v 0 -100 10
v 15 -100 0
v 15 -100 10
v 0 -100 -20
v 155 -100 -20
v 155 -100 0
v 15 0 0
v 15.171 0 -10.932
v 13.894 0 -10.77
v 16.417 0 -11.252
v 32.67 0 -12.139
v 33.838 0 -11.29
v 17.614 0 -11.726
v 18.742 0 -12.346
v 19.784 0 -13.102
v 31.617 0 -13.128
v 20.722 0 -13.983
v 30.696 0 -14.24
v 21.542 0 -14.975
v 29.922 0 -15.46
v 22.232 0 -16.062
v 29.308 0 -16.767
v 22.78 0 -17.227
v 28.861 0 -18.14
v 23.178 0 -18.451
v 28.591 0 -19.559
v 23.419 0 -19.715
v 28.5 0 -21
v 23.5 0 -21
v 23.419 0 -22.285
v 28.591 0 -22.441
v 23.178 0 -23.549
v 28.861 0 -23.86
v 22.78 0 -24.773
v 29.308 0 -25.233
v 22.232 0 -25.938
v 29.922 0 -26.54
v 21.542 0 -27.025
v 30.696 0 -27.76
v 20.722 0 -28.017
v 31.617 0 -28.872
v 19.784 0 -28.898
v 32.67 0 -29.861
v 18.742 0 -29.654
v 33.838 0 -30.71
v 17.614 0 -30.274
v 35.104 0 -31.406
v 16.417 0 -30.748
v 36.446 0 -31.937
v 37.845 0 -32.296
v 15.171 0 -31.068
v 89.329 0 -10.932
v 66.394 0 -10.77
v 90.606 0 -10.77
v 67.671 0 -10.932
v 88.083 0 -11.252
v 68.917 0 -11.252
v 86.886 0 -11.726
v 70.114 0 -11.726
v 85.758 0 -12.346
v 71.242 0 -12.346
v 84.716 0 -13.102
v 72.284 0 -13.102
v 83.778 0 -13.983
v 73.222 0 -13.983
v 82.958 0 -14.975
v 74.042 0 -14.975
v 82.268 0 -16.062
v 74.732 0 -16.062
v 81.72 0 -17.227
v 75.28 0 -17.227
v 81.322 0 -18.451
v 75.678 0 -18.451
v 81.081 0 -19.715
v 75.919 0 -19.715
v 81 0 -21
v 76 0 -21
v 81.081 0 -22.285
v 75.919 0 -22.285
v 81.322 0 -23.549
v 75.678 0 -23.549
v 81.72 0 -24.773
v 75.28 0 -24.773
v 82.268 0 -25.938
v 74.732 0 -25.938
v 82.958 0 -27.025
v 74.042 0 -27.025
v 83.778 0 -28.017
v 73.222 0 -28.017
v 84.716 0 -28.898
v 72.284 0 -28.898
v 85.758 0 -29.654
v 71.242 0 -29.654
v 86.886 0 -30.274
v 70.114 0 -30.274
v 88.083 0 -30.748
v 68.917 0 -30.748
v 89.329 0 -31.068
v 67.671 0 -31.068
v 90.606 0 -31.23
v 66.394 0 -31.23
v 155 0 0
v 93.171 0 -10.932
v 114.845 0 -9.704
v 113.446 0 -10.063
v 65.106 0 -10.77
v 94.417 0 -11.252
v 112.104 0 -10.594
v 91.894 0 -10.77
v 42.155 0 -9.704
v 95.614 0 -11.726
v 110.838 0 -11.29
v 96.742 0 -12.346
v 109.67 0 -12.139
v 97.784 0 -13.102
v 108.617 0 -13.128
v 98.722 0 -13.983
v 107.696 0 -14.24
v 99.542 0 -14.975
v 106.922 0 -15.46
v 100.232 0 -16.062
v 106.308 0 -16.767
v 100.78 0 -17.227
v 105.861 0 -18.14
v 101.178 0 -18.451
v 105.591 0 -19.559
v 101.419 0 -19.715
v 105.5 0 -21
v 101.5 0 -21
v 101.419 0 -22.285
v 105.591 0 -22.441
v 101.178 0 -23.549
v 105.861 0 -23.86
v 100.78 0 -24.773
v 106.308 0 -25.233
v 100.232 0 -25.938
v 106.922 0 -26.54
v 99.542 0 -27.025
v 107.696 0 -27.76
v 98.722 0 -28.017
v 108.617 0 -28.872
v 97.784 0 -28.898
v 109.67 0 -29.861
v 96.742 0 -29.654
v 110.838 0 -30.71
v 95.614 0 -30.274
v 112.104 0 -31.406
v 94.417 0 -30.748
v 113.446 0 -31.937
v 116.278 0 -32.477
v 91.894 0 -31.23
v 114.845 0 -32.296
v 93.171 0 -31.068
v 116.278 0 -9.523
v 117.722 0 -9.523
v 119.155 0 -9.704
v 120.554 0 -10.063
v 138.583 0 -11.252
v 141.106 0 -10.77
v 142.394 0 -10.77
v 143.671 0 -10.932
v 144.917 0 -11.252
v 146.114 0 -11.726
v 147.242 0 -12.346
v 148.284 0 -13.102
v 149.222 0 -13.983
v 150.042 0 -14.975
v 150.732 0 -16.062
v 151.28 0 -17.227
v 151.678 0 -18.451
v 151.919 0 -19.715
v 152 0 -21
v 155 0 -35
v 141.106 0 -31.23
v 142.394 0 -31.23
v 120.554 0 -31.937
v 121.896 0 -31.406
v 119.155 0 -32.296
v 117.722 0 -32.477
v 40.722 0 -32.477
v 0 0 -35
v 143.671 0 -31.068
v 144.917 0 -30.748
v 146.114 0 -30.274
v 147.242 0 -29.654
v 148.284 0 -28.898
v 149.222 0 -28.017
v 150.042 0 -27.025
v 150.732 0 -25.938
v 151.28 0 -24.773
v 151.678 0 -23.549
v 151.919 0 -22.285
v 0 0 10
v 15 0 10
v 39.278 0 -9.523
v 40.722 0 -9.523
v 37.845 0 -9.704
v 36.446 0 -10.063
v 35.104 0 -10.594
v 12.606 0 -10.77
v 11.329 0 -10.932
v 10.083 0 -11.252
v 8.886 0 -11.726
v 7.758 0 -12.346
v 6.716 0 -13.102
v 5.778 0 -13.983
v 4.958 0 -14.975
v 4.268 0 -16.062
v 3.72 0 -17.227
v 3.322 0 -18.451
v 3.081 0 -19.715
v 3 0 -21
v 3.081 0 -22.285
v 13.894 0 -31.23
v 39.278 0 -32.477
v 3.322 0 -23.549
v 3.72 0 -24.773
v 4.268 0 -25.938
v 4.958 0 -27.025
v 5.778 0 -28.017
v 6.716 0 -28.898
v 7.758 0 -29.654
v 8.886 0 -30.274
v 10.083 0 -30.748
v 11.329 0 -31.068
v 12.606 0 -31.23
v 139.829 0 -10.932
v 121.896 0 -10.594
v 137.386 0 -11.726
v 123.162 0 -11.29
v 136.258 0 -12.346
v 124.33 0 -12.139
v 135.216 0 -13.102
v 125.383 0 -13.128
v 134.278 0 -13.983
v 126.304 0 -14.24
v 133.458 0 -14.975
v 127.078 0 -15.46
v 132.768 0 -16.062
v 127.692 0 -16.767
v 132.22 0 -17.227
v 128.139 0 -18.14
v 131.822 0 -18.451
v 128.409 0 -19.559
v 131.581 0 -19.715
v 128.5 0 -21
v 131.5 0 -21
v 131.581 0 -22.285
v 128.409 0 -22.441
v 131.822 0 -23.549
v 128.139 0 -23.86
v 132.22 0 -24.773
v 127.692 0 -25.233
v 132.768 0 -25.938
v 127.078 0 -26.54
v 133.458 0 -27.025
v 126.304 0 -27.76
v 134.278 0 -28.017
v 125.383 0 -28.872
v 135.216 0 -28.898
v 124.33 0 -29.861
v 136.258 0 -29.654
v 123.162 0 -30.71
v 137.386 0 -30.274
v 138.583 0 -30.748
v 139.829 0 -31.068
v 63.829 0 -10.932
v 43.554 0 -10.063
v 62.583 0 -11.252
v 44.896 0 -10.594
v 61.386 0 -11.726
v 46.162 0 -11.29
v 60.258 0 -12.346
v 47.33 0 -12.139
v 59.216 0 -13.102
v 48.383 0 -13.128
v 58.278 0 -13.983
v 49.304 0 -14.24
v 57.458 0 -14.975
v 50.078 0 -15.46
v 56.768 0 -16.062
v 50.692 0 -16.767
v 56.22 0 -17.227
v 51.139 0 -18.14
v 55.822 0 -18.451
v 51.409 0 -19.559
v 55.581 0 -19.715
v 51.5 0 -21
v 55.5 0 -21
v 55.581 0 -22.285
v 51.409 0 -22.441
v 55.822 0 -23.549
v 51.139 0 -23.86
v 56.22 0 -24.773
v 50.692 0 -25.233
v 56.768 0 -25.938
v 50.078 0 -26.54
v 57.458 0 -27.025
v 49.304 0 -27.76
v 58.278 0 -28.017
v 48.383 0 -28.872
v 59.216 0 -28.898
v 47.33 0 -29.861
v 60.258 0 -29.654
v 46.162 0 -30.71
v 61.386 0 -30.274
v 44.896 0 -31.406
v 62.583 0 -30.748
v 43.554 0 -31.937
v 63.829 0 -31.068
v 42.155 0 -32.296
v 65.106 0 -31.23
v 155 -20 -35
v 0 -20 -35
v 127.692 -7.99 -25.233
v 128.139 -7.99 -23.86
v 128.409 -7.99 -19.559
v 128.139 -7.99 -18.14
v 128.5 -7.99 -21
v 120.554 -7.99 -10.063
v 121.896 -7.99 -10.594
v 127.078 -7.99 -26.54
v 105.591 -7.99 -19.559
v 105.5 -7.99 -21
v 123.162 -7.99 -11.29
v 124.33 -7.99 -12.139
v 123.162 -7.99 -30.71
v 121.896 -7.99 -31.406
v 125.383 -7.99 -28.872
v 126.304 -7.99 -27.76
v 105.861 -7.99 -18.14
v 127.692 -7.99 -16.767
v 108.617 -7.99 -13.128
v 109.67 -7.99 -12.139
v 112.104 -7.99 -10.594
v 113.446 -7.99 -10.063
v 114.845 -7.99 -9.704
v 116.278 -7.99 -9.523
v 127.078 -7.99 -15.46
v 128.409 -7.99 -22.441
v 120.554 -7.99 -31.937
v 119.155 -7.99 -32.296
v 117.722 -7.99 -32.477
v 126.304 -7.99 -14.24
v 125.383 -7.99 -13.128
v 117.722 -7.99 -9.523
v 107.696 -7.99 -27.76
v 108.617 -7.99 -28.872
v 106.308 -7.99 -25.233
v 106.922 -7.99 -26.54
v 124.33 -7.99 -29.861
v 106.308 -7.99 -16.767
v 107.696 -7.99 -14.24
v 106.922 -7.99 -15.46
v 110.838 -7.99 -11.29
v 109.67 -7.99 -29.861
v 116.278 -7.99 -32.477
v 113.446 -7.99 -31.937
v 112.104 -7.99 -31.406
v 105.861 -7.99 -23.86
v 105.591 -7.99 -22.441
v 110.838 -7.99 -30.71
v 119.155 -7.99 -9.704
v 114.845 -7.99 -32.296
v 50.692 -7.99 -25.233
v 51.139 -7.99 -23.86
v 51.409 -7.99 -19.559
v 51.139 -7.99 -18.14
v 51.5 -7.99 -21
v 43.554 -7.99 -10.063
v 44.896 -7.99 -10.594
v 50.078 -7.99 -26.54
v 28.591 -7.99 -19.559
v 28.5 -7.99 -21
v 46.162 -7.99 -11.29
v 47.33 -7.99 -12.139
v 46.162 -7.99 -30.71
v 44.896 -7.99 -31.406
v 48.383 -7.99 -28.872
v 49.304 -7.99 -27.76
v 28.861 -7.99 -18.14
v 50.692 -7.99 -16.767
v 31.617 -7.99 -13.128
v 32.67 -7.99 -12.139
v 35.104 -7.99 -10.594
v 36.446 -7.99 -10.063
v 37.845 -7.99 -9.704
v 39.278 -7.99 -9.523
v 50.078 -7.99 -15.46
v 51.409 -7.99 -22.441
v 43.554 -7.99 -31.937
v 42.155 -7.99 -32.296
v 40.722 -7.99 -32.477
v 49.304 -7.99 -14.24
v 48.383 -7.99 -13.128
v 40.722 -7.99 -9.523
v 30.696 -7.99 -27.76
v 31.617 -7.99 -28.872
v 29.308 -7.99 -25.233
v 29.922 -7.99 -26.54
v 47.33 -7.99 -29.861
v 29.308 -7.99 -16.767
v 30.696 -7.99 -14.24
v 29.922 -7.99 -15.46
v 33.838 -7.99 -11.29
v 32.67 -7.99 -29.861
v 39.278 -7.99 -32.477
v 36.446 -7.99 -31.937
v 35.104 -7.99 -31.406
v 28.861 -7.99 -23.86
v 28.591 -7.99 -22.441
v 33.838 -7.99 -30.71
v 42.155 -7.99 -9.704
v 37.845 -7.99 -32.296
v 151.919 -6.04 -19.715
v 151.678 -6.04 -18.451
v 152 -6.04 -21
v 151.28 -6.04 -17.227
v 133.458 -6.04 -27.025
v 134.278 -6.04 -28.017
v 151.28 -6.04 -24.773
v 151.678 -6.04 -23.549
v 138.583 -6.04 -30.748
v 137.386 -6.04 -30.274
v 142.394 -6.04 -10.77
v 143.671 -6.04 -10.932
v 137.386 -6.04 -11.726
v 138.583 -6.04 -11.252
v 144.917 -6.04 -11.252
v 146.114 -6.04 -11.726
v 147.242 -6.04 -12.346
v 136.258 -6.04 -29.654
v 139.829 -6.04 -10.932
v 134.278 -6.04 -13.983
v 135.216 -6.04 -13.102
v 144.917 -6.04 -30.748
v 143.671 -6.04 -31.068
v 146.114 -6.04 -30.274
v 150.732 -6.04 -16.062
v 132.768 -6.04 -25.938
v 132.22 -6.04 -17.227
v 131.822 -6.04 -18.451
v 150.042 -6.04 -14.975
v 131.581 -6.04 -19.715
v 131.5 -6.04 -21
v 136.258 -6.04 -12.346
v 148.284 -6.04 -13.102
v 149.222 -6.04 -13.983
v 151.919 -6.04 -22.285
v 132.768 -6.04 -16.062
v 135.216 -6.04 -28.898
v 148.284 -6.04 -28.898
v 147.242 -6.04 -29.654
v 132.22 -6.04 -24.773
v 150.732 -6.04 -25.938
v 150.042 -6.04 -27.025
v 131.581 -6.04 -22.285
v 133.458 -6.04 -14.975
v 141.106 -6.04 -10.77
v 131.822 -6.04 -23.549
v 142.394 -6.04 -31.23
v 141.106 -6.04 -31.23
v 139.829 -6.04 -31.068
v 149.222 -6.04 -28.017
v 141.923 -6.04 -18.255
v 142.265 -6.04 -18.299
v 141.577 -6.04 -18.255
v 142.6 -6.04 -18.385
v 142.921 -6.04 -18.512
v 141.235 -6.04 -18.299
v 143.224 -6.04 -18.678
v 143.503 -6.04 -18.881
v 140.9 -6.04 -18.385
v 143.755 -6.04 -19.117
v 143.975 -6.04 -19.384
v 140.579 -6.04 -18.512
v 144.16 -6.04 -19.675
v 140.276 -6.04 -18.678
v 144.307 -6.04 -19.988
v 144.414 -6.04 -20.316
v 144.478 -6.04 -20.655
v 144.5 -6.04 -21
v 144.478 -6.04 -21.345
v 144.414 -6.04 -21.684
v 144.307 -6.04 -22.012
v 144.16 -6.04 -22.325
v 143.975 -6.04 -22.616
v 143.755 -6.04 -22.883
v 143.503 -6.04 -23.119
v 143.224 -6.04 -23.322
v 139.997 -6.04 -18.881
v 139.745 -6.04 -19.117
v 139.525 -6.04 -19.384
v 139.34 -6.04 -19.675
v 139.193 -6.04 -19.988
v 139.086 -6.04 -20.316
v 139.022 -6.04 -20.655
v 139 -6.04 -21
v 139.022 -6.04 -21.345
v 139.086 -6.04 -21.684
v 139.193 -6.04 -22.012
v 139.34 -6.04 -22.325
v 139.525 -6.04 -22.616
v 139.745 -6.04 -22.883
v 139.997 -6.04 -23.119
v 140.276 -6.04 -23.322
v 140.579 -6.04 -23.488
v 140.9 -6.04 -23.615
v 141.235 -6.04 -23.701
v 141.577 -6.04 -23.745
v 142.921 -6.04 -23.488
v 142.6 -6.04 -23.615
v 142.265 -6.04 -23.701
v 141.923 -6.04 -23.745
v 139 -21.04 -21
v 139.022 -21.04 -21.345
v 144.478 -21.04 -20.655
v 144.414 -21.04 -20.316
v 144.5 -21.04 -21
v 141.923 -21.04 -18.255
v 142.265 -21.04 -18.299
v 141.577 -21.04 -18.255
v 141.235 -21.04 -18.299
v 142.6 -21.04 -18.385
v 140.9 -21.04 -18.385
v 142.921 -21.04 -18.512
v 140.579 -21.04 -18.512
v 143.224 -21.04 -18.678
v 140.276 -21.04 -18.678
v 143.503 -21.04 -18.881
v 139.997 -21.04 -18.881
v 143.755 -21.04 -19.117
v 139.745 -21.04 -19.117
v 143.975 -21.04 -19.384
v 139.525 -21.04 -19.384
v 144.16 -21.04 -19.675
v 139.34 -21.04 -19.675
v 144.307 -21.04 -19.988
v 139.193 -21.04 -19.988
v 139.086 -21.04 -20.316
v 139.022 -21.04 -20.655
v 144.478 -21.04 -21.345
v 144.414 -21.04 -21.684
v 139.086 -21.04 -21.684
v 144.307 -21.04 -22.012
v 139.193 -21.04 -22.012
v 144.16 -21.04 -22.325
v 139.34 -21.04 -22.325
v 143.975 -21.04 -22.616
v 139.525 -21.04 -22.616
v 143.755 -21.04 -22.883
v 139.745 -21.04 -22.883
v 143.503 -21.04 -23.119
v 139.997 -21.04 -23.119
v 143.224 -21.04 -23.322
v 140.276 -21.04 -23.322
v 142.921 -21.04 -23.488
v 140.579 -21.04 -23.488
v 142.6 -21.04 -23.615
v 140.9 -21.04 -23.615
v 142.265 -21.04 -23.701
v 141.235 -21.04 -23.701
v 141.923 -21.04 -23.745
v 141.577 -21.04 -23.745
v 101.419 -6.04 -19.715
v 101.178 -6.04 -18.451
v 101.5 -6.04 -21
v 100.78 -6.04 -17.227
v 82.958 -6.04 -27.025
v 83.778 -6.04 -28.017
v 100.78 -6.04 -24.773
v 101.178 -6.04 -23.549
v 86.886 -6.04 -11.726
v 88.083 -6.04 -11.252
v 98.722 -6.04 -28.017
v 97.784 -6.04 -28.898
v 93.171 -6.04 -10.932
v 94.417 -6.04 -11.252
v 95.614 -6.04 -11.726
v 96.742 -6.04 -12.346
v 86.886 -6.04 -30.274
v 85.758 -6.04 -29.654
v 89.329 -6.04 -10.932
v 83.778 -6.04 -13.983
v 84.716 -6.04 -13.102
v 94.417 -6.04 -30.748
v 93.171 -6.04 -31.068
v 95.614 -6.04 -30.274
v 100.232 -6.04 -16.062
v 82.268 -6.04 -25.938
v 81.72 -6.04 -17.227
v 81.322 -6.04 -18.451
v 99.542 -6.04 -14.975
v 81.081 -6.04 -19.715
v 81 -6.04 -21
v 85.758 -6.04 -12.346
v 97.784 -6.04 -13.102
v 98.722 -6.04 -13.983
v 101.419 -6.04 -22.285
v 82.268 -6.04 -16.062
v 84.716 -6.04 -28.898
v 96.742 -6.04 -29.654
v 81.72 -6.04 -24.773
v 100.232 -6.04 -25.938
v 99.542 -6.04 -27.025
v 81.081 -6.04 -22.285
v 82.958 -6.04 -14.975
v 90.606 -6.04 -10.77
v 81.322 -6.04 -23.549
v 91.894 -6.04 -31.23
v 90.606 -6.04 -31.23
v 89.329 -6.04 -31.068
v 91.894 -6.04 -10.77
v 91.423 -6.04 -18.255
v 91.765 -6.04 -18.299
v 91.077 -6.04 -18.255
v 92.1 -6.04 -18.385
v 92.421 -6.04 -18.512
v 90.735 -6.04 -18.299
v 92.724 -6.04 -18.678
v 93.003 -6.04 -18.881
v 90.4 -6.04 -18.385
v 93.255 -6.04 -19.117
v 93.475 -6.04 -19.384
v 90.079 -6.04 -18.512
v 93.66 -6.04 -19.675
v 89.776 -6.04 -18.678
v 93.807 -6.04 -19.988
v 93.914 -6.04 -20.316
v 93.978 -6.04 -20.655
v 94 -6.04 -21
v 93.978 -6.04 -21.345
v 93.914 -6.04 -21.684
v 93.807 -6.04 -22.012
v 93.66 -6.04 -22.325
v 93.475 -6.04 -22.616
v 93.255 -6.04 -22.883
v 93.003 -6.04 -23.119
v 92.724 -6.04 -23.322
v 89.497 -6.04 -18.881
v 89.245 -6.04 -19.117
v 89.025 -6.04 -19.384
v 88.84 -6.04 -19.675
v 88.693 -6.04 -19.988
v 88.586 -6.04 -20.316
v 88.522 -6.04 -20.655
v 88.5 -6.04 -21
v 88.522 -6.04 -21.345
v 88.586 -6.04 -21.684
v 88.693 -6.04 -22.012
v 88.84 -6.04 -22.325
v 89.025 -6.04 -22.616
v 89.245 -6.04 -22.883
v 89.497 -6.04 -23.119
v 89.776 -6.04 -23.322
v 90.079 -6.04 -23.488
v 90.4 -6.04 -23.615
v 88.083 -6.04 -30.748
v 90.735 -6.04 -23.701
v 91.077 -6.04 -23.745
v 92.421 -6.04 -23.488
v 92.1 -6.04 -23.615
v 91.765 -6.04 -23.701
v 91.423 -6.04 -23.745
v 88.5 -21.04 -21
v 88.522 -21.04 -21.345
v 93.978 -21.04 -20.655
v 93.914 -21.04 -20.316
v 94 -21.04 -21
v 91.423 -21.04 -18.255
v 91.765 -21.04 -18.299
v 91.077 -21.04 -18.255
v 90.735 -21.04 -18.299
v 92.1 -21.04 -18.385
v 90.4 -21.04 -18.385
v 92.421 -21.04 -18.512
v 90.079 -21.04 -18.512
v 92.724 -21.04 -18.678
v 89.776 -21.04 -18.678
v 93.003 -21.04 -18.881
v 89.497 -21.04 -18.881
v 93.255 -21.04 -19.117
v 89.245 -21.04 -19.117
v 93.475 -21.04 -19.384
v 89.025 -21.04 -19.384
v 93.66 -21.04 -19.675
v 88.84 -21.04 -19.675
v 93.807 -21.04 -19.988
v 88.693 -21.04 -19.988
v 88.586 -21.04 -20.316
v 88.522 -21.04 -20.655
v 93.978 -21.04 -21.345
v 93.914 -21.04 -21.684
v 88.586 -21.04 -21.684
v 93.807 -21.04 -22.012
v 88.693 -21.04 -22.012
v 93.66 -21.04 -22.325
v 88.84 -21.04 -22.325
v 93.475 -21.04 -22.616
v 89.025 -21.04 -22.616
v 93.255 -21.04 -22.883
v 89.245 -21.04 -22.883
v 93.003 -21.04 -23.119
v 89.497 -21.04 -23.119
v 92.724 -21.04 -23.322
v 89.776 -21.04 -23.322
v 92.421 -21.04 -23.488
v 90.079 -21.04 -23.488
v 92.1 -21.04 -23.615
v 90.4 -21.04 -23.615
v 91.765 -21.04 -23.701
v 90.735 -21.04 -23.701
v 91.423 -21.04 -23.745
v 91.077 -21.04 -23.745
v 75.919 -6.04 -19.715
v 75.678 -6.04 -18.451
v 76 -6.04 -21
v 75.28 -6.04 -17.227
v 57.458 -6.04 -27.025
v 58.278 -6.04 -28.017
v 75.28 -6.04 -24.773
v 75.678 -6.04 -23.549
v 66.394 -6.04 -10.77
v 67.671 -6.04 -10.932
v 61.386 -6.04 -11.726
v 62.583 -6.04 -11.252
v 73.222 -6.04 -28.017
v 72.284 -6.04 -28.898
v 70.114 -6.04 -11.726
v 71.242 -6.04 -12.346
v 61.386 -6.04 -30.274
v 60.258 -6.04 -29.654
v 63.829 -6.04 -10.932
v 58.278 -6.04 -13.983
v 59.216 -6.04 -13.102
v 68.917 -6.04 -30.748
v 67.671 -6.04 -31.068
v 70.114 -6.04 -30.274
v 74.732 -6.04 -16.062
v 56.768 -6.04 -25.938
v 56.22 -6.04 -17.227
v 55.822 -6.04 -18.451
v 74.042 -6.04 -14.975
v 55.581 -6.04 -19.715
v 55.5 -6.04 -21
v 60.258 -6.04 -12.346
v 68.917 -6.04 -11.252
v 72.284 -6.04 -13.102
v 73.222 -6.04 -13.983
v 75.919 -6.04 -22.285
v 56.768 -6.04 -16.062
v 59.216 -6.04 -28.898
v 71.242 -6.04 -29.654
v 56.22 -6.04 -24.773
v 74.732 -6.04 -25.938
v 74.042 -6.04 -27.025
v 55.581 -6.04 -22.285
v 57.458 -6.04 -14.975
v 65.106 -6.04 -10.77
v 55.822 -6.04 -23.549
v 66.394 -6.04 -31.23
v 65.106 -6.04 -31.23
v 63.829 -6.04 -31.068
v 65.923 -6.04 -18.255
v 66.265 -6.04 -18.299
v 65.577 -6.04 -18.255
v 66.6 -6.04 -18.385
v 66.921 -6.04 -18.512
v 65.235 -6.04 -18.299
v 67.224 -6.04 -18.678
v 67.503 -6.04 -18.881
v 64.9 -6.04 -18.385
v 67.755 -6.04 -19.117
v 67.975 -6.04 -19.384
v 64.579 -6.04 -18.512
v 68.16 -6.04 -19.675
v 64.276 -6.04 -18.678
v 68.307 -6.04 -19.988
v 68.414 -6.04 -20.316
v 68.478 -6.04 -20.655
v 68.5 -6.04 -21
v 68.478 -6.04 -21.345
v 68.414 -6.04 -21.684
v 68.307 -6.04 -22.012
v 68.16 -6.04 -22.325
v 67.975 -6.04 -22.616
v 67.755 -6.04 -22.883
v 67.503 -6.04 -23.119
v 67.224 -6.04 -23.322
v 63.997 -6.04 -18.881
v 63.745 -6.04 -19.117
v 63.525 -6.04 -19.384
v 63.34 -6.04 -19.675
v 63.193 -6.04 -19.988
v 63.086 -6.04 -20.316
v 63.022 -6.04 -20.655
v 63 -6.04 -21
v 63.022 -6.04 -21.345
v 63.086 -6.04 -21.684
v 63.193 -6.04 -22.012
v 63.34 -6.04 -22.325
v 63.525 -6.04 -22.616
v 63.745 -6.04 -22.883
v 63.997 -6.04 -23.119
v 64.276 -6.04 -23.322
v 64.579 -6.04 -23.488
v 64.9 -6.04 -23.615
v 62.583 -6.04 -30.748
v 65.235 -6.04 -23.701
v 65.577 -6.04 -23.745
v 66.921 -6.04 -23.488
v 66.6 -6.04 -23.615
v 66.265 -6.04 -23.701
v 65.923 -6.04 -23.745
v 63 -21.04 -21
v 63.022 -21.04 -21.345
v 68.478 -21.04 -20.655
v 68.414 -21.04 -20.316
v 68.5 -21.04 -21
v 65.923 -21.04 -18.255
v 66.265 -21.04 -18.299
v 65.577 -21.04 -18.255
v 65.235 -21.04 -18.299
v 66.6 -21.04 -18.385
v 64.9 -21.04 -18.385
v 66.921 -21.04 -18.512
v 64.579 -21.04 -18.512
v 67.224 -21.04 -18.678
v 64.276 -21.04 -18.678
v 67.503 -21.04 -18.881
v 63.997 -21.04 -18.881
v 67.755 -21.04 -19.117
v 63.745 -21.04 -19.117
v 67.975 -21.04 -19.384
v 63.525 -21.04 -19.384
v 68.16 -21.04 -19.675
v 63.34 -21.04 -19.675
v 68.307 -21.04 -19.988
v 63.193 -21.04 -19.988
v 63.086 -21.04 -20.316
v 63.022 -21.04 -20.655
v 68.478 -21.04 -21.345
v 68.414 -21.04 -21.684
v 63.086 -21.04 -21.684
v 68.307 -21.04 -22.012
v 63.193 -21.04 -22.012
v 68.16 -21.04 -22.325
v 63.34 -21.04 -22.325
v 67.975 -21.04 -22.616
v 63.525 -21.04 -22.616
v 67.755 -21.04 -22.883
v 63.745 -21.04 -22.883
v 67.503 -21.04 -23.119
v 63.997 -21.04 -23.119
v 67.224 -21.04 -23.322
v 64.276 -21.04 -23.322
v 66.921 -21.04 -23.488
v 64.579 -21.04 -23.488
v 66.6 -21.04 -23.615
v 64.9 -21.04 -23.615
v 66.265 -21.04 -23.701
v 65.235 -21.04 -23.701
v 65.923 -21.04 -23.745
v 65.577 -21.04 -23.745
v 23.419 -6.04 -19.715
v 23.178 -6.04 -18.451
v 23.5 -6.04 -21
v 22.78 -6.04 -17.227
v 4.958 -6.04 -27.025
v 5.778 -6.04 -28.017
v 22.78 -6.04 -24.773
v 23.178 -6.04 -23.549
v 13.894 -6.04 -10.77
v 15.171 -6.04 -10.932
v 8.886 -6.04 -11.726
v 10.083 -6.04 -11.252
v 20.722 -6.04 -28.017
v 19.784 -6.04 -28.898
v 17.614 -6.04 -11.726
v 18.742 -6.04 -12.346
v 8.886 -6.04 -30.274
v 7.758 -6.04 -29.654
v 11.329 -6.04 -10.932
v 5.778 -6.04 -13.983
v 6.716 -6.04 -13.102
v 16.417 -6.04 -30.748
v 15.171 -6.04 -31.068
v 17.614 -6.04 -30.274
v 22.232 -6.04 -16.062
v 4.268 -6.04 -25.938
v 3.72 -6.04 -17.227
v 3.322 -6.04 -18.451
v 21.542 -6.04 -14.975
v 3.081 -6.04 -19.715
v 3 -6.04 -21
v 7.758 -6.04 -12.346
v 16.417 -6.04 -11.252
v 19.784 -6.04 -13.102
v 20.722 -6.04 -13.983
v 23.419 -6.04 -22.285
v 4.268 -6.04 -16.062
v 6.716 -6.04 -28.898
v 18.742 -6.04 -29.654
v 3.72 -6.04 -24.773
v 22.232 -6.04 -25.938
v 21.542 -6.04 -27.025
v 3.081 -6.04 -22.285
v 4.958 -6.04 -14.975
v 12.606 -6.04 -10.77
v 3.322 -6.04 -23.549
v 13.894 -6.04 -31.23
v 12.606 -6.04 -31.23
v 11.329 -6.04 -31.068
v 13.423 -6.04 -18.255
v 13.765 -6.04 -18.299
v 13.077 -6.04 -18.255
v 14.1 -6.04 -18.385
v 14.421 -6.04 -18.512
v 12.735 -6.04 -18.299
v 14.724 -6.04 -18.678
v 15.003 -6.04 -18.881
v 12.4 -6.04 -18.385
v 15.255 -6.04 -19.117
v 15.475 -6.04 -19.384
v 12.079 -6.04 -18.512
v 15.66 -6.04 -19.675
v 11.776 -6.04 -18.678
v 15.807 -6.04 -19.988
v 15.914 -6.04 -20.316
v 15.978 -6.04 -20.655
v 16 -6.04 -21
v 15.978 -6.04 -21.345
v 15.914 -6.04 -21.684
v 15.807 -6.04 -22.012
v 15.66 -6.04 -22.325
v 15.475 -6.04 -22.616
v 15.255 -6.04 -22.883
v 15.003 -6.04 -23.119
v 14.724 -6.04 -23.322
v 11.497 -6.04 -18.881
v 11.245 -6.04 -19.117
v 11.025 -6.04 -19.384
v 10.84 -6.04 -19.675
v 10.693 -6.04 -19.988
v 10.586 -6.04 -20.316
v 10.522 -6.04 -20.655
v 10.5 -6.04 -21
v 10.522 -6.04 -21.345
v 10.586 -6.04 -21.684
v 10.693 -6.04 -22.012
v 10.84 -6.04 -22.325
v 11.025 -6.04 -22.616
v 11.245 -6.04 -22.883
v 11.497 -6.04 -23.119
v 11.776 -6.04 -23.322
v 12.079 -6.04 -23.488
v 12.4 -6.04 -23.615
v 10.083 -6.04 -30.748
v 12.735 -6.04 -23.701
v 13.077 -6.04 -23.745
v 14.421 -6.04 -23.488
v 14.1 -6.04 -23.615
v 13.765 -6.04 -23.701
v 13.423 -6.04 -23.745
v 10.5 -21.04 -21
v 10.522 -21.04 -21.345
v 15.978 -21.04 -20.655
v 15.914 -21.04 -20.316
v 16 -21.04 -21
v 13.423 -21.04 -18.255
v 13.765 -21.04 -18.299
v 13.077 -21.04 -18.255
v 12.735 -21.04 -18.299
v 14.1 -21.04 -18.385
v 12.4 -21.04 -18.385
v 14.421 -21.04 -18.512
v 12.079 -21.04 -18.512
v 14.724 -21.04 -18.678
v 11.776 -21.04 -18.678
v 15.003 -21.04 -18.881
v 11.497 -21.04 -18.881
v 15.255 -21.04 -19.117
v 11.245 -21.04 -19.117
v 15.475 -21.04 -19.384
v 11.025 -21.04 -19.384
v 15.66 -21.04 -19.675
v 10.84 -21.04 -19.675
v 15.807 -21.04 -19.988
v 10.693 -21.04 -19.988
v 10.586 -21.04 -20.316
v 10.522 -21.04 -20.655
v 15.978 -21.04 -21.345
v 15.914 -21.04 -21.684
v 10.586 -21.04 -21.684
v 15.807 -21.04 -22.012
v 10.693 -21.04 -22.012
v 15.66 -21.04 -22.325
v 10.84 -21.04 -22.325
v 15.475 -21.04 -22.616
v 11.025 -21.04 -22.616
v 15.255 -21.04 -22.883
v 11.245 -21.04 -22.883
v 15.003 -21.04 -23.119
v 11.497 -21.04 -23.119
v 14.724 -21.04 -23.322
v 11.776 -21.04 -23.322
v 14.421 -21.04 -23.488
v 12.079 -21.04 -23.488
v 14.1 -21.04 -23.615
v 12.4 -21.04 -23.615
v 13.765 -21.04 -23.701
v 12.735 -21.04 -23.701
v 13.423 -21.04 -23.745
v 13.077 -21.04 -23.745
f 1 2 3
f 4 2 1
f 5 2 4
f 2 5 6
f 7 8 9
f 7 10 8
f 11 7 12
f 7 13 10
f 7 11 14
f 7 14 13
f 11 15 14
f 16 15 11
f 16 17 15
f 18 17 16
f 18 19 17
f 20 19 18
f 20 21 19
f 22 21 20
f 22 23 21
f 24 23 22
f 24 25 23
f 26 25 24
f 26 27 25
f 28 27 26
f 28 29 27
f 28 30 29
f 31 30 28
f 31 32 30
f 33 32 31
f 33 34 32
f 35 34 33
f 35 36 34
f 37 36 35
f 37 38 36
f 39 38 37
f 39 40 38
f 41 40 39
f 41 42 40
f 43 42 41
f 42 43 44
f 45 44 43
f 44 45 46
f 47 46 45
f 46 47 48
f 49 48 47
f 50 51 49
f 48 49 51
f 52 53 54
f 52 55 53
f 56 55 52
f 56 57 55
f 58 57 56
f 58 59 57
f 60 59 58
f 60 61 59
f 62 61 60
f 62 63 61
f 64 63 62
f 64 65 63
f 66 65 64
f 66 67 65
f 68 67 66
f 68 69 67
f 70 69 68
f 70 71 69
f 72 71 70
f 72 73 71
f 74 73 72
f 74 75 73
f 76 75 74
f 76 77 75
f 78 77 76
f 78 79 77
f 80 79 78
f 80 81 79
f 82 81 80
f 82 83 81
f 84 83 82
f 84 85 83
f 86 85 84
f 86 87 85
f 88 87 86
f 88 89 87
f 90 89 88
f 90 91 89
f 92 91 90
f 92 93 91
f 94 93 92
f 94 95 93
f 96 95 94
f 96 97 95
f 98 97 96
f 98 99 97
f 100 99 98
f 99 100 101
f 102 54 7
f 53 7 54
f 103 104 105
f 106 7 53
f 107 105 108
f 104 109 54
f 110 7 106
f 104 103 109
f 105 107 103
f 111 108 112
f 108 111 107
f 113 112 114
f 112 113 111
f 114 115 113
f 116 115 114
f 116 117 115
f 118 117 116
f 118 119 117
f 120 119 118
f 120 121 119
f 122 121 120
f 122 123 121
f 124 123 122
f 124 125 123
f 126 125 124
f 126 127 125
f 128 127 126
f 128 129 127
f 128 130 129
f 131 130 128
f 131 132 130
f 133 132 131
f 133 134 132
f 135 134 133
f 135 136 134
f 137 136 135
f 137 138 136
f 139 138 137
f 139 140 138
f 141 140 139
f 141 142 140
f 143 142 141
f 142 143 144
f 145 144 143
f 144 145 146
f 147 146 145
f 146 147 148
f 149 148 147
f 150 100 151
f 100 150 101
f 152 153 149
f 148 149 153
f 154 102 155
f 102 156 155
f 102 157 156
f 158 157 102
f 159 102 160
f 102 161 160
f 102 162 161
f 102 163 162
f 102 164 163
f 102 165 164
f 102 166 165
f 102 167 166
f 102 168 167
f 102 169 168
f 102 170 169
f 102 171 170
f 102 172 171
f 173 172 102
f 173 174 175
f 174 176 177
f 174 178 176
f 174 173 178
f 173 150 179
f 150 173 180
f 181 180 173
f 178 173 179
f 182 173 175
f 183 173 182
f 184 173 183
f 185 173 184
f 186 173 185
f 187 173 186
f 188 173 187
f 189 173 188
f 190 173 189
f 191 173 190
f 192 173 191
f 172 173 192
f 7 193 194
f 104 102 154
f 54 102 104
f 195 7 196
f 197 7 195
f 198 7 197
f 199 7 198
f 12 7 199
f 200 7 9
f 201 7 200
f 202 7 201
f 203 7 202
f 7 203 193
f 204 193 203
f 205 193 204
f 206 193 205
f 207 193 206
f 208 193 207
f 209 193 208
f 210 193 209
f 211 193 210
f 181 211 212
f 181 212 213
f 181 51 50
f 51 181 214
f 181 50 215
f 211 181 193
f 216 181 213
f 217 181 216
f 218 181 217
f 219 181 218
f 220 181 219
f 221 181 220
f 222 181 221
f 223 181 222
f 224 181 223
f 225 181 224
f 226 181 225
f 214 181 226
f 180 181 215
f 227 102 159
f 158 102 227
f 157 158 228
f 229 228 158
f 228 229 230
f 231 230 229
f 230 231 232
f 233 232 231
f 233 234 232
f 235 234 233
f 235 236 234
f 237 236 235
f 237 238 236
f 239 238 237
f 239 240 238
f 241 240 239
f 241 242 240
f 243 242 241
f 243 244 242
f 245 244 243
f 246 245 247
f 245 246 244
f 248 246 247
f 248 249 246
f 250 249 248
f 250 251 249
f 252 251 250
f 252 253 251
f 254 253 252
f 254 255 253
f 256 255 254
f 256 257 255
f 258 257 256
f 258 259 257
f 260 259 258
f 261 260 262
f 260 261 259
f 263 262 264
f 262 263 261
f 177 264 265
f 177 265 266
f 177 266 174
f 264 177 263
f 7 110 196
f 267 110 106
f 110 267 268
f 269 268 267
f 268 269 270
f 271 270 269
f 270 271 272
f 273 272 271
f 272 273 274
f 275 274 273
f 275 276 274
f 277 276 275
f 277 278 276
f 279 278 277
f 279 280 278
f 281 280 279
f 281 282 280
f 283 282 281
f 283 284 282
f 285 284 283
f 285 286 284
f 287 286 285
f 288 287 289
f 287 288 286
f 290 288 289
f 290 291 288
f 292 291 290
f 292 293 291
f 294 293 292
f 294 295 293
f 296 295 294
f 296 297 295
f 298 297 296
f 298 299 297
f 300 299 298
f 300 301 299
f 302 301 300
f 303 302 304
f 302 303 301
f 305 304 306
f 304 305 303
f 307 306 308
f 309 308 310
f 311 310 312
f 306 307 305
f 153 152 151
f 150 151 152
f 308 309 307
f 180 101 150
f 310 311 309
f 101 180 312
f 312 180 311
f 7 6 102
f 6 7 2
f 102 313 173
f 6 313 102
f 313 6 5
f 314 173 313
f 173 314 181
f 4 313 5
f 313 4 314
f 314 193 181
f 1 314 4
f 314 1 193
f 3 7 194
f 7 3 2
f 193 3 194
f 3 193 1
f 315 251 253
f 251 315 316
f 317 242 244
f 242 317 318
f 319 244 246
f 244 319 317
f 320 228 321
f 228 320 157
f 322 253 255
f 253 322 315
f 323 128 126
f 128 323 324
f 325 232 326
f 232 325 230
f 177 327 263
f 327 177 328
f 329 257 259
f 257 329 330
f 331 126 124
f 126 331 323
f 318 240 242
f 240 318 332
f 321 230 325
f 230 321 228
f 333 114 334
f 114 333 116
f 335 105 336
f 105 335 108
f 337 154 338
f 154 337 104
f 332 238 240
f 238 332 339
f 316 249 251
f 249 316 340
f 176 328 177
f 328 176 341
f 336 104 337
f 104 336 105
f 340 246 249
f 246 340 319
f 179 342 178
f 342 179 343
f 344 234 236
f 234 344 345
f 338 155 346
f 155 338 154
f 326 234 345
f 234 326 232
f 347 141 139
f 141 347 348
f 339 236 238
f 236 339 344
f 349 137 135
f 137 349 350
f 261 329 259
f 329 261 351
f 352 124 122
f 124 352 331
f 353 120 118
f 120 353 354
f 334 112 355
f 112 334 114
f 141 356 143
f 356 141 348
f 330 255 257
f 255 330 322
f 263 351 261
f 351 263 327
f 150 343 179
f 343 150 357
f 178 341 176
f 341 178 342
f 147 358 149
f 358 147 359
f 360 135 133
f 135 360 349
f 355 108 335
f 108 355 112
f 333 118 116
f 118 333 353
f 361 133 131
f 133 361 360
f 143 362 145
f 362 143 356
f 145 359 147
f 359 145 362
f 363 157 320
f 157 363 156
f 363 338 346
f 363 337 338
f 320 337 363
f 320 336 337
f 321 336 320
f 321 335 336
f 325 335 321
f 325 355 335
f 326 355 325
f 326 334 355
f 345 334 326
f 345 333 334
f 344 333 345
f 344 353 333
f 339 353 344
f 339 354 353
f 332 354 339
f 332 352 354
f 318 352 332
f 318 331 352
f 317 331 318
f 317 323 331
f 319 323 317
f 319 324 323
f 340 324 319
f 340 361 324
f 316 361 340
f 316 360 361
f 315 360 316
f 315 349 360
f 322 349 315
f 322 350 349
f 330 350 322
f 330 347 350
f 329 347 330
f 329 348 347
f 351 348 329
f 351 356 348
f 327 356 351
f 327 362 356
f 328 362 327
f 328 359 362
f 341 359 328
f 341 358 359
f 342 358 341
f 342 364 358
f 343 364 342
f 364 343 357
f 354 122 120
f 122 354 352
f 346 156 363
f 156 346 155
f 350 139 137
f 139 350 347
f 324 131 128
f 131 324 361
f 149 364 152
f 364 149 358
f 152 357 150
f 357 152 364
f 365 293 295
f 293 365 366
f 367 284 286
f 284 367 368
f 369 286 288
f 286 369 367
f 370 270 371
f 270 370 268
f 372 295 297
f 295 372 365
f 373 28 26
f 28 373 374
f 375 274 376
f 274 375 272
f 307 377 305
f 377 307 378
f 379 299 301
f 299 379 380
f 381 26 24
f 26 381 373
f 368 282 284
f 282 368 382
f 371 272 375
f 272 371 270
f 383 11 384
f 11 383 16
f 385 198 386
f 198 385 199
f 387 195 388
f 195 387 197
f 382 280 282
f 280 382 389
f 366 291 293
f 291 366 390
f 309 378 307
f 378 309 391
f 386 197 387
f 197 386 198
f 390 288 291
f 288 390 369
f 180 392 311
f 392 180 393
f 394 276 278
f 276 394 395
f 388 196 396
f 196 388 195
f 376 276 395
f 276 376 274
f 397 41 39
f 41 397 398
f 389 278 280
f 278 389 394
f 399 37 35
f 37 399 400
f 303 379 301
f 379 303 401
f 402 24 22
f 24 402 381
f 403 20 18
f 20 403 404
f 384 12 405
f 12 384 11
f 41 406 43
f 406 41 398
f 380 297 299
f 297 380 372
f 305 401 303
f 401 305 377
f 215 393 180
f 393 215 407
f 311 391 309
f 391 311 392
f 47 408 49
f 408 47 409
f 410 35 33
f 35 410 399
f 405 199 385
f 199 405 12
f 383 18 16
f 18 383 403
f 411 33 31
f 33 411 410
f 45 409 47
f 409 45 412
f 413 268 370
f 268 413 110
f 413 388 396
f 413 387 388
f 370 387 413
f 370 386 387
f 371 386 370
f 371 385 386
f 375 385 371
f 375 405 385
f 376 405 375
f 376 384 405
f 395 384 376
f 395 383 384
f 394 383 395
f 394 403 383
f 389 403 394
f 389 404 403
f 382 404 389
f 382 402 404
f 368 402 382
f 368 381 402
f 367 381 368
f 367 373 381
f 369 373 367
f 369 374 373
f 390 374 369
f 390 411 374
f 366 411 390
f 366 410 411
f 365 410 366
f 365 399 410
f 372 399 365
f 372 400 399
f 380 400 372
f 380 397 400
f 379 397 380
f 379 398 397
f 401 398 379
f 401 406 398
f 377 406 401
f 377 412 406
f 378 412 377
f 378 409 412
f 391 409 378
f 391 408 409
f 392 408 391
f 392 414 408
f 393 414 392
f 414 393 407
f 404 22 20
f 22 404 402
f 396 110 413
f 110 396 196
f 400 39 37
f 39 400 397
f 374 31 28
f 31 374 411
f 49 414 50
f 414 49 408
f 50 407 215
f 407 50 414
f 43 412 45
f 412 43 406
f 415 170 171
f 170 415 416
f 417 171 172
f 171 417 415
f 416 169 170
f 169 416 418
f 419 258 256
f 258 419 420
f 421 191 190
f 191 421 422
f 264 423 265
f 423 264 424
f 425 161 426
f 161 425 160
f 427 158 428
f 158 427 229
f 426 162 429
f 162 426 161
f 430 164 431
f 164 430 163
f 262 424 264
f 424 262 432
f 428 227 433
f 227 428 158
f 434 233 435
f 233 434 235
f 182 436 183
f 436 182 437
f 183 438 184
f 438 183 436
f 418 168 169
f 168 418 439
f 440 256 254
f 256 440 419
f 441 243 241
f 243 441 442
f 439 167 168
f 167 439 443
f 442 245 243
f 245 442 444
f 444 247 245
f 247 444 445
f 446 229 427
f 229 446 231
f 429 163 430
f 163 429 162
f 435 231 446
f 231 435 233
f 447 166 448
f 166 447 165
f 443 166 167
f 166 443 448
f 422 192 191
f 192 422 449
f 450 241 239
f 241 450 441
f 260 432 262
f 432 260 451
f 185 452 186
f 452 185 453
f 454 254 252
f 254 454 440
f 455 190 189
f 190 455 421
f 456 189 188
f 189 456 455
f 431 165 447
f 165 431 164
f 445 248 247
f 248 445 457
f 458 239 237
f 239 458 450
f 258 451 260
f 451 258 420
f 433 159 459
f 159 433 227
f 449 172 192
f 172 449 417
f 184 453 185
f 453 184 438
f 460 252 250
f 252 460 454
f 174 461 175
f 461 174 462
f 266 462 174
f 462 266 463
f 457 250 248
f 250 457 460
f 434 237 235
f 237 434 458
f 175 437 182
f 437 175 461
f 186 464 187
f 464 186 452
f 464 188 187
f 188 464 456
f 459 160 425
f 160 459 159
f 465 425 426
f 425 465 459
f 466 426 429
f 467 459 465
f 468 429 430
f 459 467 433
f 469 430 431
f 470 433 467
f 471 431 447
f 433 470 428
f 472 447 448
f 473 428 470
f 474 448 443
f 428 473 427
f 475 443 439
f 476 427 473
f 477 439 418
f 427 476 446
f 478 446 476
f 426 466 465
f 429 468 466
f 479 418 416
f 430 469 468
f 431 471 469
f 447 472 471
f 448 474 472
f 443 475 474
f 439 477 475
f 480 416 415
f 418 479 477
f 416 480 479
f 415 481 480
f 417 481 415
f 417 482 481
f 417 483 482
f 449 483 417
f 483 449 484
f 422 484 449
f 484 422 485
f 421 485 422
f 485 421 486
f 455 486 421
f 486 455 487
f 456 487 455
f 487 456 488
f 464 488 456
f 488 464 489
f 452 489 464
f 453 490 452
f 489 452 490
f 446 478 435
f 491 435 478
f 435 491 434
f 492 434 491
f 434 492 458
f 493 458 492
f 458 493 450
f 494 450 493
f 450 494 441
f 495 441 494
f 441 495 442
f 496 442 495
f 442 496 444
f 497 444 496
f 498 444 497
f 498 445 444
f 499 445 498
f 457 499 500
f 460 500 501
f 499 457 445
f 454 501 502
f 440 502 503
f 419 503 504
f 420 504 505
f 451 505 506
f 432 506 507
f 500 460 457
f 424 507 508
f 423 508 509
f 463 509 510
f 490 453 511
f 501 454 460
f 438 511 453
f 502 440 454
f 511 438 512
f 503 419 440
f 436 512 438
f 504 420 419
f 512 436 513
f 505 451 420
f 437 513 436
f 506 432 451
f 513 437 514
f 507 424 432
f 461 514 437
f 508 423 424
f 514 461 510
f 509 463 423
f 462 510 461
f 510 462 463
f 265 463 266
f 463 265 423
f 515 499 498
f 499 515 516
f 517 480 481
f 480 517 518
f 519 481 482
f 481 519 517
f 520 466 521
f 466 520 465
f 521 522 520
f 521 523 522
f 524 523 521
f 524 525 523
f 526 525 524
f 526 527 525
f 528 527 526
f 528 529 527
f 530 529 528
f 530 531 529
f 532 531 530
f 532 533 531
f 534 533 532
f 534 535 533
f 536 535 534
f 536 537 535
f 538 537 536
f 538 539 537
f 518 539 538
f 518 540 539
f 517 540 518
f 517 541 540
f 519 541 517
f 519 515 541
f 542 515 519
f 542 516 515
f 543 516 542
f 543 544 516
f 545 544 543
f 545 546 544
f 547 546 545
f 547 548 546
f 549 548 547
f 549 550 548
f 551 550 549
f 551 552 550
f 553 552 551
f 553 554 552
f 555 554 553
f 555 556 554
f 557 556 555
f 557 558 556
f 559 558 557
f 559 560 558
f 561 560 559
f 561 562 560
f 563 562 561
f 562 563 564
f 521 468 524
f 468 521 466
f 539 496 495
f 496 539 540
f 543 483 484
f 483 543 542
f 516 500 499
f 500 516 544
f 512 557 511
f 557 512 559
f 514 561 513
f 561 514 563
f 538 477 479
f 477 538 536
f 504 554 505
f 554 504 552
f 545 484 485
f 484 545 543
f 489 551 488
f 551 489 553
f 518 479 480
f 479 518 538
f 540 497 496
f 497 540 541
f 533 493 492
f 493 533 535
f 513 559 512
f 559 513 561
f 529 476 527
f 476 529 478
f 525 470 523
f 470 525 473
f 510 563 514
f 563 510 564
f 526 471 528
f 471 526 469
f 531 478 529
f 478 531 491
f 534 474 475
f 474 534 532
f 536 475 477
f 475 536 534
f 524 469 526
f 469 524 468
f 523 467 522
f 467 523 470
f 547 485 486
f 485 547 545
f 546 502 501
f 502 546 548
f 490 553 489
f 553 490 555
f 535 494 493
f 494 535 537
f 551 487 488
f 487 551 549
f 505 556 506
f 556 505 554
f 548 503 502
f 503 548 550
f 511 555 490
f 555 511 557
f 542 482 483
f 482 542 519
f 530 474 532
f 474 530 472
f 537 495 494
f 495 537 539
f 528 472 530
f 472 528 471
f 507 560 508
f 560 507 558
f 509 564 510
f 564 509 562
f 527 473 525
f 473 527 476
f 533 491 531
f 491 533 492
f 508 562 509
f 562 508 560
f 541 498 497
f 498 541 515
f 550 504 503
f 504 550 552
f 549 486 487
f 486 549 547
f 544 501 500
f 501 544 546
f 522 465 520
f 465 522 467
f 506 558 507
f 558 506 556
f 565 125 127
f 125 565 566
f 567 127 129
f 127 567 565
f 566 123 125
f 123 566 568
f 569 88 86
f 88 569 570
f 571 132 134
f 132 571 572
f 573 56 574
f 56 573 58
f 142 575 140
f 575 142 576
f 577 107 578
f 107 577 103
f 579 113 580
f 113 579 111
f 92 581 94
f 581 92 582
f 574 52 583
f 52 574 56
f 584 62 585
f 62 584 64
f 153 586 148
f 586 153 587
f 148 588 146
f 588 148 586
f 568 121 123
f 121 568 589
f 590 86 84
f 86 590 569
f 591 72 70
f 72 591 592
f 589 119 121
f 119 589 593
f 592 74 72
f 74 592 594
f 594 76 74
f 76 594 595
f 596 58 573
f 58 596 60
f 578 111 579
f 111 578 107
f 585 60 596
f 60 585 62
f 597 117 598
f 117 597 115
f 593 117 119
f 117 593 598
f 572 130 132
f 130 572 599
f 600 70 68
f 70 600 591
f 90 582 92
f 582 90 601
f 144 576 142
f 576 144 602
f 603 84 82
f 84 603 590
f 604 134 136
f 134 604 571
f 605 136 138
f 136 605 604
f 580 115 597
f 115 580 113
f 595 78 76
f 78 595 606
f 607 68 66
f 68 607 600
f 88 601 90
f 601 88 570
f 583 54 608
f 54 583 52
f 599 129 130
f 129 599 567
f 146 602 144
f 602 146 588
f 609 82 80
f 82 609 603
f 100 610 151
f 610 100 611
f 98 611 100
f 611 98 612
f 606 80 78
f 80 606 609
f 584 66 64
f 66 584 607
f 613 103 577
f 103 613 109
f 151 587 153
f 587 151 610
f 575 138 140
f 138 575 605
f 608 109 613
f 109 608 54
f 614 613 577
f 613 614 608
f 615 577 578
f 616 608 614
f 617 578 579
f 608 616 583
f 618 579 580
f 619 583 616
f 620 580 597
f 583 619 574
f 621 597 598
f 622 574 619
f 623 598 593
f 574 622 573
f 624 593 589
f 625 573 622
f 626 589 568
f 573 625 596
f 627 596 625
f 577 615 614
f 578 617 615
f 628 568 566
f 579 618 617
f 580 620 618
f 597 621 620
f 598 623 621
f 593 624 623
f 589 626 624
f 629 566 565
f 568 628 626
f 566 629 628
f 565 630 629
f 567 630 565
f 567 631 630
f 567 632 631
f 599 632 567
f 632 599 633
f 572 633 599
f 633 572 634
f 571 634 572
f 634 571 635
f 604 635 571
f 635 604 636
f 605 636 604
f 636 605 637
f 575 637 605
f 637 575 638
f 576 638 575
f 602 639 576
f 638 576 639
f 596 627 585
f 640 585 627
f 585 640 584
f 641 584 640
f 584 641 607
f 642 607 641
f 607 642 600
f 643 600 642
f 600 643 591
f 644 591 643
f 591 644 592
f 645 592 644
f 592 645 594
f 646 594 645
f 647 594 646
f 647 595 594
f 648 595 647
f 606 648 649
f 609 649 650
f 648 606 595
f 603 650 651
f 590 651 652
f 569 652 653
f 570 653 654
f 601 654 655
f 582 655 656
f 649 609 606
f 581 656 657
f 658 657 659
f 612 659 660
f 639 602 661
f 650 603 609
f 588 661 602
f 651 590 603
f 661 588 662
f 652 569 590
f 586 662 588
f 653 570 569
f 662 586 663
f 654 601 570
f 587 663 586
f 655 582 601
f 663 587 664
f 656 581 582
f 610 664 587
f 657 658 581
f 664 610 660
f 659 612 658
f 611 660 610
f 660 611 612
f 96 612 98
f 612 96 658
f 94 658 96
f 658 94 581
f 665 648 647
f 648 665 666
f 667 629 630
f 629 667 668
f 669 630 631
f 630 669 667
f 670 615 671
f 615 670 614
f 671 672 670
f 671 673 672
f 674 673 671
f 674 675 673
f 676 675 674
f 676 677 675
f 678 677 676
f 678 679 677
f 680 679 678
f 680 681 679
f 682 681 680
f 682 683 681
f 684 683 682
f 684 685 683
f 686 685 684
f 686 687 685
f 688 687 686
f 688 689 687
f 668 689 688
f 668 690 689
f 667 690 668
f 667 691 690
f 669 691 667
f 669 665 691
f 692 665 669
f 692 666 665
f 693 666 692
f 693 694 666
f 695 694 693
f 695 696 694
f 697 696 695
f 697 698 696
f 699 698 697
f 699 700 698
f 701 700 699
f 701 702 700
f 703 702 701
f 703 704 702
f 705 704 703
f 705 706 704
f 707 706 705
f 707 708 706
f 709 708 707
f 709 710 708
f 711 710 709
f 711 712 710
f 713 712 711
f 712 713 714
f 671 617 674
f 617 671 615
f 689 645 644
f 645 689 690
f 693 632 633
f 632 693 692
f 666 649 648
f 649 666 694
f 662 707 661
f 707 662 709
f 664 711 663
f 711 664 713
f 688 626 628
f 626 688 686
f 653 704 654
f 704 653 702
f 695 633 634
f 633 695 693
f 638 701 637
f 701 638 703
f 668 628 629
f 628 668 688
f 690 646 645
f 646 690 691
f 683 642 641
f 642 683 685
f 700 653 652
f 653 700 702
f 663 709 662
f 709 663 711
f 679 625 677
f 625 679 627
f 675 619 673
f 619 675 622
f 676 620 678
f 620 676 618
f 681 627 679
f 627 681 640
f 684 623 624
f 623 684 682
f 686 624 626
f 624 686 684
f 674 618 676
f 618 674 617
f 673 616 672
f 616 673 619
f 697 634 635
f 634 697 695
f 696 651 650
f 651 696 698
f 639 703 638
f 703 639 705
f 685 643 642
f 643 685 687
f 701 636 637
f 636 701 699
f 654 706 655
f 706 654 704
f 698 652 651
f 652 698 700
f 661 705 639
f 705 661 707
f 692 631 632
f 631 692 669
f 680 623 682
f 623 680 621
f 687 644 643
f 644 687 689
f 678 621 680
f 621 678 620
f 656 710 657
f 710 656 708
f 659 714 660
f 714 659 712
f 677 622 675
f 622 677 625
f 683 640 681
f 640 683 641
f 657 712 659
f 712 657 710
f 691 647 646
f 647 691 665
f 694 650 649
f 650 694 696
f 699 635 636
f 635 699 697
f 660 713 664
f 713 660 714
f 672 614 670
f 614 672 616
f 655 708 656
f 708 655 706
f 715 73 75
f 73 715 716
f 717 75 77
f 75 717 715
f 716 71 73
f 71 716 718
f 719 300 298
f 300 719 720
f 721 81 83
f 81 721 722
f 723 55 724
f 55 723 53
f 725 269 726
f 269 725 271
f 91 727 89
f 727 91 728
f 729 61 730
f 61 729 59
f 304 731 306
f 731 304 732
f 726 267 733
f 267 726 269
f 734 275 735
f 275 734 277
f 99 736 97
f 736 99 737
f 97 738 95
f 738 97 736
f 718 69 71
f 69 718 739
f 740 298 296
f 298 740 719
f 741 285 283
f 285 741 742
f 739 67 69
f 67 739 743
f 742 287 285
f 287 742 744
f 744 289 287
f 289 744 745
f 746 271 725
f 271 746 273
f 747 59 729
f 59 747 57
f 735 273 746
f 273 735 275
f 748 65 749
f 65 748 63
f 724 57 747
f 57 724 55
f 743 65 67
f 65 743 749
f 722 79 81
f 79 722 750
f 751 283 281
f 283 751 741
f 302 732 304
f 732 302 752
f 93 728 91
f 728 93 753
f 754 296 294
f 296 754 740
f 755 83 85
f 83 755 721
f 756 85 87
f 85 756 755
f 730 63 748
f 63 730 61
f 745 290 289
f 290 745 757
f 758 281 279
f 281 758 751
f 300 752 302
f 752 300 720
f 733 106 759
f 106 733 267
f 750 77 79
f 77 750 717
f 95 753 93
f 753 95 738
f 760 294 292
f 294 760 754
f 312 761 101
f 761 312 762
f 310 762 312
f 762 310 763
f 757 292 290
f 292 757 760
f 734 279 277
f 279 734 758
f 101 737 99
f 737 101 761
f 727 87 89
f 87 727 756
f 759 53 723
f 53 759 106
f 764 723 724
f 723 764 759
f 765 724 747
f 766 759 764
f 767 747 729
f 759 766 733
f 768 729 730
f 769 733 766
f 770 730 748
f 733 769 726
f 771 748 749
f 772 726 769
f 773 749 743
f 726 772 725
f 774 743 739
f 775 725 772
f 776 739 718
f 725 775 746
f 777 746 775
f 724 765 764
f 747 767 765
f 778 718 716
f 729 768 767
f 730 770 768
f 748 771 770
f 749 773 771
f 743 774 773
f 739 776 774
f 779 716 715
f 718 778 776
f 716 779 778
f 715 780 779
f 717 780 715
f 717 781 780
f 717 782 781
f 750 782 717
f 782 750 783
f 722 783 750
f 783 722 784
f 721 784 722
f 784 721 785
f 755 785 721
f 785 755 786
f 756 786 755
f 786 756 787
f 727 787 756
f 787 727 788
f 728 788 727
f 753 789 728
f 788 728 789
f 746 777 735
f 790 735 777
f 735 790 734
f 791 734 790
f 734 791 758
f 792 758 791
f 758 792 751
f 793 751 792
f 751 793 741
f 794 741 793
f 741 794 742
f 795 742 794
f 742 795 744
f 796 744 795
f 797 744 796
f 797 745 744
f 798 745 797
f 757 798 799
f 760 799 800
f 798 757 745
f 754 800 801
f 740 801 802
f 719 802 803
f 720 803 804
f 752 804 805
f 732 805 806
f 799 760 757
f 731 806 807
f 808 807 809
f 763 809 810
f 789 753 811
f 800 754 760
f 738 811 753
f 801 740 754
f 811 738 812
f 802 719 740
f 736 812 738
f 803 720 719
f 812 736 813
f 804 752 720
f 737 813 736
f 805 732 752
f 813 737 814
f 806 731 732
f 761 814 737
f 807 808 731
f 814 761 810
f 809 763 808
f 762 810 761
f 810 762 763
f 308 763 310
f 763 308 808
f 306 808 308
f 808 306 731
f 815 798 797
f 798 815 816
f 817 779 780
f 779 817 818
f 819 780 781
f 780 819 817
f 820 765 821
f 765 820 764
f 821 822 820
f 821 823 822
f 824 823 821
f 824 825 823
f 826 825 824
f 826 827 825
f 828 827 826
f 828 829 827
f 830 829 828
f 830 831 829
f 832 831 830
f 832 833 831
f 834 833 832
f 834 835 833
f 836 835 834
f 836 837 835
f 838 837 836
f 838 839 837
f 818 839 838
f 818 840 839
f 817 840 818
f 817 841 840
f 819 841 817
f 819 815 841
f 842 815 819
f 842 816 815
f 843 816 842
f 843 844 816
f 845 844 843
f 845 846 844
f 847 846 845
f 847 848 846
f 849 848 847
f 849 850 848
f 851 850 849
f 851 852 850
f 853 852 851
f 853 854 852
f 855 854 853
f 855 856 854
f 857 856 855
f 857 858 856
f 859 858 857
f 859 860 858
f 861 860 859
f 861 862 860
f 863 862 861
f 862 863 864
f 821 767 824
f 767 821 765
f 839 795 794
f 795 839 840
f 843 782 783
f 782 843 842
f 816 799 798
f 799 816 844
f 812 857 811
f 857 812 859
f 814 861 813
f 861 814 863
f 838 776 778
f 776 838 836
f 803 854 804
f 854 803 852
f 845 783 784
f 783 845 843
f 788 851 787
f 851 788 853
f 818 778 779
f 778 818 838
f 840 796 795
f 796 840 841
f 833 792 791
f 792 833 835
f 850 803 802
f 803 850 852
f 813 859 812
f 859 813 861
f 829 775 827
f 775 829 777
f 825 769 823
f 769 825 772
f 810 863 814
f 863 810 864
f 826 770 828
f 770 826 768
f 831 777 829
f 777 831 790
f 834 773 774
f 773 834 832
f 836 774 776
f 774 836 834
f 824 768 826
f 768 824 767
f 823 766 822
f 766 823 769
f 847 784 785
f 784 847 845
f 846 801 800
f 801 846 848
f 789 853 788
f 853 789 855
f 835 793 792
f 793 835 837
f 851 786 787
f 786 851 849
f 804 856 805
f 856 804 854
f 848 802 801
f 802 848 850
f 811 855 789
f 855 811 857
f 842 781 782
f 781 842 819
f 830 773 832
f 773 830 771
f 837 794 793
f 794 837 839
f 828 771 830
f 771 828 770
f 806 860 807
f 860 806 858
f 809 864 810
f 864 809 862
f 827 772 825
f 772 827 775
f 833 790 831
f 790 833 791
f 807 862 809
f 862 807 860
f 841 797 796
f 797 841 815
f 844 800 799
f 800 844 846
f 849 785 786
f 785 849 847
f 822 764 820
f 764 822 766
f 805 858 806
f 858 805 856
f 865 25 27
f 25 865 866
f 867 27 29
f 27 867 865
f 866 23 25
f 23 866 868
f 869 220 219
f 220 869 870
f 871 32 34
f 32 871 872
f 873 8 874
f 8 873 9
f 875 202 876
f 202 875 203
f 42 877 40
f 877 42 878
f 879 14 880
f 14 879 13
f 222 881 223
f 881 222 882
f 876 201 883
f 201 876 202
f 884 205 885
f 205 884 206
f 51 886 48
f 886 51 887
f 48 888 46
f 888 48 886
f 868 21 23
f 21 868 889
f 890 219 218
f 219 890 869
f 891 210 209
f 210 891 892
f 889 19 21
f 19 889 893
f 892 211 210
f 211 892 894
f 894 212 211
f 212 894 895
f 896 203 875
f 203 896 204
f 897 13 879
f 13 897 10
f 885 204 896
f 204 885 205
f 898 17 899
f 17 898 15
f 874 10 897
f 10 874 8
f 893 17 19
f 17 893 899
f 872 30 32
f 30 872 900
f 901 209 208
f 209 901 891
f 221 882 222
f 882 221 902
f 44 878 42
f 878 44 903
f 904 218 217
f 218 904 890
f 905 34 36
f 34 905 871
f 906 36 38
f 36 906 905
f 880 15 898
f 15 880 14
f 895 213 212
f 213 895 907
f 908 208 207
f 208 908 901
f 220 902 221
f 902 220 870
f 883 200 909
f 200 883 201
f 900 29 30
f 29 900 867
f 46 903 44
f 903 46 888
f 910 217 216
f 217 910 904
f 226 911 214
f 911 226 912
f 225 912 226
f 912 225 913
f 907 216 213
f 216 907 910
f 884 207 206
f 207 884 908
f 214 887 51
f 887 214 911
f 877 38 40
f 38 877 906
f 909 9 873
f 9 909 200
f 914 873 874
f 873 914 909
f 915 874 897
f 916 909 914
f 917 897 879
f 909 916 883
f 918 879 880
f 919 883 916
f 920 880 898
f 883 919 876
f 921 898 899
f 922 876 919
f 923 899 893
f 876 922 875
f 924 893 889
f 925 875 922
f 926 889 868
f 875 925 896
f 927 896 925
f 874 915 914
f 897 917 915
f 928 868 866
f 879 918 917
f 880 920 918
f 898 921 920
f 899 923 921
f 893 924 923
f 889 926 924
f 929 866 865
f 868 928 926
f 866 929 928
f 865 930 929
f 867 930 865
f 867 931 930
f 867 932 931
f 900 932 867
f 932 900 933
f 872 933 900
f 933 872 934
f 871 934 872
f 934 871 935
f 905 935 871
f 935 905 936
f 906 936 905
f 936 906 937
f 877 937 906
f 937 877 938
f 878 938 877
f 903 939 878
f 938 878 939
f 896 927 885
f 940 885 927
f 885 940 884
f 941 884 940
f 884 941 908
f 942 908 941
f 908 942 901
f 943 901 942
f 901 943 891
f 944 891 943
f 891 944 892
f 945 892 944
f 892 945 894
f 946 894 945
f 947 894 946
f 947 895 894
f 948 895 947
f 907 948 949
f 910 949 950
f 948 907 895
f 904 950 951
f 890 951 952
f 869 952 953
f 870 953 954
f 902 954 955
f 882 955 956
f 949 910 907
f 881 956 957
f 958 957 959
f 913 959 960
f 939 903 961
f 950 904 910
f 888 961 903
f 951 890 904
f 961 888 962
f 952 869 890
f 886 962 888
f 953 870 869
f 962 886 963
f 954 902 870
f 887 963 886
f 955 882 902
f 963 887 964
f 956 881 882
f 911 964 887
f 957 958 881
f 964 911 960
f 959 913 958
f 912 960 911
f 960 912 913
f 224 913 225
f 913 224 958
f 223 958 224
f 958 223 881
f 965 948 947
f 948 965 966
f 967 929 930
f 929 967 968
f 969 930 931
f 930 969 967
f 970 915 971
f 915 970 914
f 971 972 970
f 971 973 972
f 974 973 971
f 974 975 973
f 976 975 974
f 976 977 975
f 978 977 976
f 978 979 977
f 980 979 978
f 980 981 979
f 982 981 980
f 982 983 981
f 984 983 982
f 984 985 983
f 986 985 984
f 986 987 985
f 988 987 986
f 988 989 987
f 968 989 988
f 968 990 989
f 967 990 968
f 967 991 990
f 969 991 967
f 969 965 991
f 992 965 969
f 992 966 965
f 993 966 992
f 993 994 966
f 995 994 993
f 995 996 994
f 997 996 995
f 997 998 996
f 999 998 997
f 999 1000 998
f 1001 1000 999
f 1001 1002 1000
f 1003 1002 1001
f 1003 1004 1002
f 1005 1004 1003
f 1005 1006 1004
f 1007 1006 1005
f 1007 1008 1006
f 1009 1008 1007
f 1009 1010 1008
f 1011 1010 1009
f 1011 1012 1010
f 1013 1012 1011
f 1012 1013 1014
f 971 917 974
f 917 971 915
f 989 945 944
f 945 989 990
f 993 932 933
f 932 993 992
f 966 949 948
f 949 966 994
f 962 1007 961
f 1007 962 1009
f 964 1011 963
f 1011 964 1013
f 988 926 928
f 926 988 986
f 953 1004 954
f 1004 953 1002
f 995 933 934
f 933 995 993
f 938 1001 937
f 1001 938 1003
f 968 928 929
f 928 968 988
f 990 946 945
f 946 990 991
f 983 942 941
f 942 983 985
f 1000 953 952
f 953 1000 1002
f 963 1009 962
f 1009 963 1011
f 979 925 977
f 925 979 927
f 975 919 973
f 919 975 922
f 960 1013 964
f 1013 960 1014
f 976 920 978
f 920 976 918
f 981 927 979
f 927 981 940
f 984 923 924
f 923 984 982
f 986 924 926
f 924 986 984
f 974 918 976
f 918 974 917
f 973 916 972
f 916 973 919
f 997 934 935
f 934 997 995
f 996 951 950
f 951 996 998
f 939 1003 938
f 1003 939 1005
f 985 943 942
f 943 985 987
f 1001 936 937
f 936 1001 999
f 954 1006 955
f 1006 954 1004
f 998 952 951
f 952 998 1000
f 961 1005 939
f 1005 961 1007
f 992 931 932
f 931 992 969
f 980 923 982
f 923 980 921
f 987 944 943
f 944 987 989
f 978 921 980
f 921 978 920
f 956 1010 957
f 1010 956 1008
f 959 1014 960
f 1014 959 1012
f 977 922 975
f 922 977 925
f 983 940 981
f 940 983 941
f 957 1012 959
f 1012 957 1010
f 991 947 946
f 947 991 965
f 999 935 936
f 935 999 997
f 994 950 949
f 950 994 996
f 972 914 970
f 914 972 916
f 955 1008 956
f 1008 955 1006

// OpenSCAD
// Metal shear magnetically attached fence

WIDTH = 100;
DEPTH = 155;
HEIGHT = 35;

FENCE_HEIGHT = 10;
FENCE_THICKNESS = 15;

BOLT_FROM_TOP = 21;
BOLTS = [[38, BOLT_FROM_TOP], [115,BOLT_FROM_TOP]];
BOLT_DIA = 21 + 2;
BOLT_HEIGHT = 8;

MAGNET_DIA = 20.5;
MAGNET_HEIGHT = 6.05;
MAGNETS = [
    [3 + MAGNET_DIA/2, BOLT_FROM_TOP],
    [BOLTS[0].x + BOLT_DIA/2 + MAGNET_DIA/2 + 4, BOLT_FROM_TOP],
    [BOLTS[1].x - BOLT_DIA/2 - MAGNET_DIA/2 - 4, BOLT_FROM_TOP],
    [DEPTH - 3 - MAGNET_DIA/2, BOLT_FROM_TOP],
];
SCREW_DIA = 5.5; // M4 Insert
SCREW_LEN = 15;

$fn = 50;

difference() {
    union() {
        // Body
        rotate([90,0,90]) linear_extrude(DEPTH) {
            polygon([
                [-WIDTH, 0], [0, 0], [0, -HEIGHT], [-20, -HEIGHT], [-WIDTH, -20]
            ]);
        }

        // Fence
        translate([0,-WIDTH,0]) cube([FENCE_THICKNESS, WIDTH, FENCE_HEIGHT]);
    }
    
    // Bolt holes
    for (p = BOLTS) {
        translate([DEPTH - p.x, 0.01, -p.y]) rotate([90,0,0]) cylinder(d=BOLT_DIA, h=BOLT_HEIGHT);
    }
    
    // Magnet holes
    for (p = MAGNETS) {
        translate([DEPTH - p.x, 0.01, -p.y]) rotate([90,0,0]) cylinder(d=MAGNET_DIA, h=MAGNET_HEIGHT);
        // Screwhole
        translate([DEPTH - p.x, 0.01, -p.y]) rotate([90,0,0]) cylinder(d=SCREW_DIA, h=MAGNET_HEIGHT + SCREW_LEN);
    }

}
